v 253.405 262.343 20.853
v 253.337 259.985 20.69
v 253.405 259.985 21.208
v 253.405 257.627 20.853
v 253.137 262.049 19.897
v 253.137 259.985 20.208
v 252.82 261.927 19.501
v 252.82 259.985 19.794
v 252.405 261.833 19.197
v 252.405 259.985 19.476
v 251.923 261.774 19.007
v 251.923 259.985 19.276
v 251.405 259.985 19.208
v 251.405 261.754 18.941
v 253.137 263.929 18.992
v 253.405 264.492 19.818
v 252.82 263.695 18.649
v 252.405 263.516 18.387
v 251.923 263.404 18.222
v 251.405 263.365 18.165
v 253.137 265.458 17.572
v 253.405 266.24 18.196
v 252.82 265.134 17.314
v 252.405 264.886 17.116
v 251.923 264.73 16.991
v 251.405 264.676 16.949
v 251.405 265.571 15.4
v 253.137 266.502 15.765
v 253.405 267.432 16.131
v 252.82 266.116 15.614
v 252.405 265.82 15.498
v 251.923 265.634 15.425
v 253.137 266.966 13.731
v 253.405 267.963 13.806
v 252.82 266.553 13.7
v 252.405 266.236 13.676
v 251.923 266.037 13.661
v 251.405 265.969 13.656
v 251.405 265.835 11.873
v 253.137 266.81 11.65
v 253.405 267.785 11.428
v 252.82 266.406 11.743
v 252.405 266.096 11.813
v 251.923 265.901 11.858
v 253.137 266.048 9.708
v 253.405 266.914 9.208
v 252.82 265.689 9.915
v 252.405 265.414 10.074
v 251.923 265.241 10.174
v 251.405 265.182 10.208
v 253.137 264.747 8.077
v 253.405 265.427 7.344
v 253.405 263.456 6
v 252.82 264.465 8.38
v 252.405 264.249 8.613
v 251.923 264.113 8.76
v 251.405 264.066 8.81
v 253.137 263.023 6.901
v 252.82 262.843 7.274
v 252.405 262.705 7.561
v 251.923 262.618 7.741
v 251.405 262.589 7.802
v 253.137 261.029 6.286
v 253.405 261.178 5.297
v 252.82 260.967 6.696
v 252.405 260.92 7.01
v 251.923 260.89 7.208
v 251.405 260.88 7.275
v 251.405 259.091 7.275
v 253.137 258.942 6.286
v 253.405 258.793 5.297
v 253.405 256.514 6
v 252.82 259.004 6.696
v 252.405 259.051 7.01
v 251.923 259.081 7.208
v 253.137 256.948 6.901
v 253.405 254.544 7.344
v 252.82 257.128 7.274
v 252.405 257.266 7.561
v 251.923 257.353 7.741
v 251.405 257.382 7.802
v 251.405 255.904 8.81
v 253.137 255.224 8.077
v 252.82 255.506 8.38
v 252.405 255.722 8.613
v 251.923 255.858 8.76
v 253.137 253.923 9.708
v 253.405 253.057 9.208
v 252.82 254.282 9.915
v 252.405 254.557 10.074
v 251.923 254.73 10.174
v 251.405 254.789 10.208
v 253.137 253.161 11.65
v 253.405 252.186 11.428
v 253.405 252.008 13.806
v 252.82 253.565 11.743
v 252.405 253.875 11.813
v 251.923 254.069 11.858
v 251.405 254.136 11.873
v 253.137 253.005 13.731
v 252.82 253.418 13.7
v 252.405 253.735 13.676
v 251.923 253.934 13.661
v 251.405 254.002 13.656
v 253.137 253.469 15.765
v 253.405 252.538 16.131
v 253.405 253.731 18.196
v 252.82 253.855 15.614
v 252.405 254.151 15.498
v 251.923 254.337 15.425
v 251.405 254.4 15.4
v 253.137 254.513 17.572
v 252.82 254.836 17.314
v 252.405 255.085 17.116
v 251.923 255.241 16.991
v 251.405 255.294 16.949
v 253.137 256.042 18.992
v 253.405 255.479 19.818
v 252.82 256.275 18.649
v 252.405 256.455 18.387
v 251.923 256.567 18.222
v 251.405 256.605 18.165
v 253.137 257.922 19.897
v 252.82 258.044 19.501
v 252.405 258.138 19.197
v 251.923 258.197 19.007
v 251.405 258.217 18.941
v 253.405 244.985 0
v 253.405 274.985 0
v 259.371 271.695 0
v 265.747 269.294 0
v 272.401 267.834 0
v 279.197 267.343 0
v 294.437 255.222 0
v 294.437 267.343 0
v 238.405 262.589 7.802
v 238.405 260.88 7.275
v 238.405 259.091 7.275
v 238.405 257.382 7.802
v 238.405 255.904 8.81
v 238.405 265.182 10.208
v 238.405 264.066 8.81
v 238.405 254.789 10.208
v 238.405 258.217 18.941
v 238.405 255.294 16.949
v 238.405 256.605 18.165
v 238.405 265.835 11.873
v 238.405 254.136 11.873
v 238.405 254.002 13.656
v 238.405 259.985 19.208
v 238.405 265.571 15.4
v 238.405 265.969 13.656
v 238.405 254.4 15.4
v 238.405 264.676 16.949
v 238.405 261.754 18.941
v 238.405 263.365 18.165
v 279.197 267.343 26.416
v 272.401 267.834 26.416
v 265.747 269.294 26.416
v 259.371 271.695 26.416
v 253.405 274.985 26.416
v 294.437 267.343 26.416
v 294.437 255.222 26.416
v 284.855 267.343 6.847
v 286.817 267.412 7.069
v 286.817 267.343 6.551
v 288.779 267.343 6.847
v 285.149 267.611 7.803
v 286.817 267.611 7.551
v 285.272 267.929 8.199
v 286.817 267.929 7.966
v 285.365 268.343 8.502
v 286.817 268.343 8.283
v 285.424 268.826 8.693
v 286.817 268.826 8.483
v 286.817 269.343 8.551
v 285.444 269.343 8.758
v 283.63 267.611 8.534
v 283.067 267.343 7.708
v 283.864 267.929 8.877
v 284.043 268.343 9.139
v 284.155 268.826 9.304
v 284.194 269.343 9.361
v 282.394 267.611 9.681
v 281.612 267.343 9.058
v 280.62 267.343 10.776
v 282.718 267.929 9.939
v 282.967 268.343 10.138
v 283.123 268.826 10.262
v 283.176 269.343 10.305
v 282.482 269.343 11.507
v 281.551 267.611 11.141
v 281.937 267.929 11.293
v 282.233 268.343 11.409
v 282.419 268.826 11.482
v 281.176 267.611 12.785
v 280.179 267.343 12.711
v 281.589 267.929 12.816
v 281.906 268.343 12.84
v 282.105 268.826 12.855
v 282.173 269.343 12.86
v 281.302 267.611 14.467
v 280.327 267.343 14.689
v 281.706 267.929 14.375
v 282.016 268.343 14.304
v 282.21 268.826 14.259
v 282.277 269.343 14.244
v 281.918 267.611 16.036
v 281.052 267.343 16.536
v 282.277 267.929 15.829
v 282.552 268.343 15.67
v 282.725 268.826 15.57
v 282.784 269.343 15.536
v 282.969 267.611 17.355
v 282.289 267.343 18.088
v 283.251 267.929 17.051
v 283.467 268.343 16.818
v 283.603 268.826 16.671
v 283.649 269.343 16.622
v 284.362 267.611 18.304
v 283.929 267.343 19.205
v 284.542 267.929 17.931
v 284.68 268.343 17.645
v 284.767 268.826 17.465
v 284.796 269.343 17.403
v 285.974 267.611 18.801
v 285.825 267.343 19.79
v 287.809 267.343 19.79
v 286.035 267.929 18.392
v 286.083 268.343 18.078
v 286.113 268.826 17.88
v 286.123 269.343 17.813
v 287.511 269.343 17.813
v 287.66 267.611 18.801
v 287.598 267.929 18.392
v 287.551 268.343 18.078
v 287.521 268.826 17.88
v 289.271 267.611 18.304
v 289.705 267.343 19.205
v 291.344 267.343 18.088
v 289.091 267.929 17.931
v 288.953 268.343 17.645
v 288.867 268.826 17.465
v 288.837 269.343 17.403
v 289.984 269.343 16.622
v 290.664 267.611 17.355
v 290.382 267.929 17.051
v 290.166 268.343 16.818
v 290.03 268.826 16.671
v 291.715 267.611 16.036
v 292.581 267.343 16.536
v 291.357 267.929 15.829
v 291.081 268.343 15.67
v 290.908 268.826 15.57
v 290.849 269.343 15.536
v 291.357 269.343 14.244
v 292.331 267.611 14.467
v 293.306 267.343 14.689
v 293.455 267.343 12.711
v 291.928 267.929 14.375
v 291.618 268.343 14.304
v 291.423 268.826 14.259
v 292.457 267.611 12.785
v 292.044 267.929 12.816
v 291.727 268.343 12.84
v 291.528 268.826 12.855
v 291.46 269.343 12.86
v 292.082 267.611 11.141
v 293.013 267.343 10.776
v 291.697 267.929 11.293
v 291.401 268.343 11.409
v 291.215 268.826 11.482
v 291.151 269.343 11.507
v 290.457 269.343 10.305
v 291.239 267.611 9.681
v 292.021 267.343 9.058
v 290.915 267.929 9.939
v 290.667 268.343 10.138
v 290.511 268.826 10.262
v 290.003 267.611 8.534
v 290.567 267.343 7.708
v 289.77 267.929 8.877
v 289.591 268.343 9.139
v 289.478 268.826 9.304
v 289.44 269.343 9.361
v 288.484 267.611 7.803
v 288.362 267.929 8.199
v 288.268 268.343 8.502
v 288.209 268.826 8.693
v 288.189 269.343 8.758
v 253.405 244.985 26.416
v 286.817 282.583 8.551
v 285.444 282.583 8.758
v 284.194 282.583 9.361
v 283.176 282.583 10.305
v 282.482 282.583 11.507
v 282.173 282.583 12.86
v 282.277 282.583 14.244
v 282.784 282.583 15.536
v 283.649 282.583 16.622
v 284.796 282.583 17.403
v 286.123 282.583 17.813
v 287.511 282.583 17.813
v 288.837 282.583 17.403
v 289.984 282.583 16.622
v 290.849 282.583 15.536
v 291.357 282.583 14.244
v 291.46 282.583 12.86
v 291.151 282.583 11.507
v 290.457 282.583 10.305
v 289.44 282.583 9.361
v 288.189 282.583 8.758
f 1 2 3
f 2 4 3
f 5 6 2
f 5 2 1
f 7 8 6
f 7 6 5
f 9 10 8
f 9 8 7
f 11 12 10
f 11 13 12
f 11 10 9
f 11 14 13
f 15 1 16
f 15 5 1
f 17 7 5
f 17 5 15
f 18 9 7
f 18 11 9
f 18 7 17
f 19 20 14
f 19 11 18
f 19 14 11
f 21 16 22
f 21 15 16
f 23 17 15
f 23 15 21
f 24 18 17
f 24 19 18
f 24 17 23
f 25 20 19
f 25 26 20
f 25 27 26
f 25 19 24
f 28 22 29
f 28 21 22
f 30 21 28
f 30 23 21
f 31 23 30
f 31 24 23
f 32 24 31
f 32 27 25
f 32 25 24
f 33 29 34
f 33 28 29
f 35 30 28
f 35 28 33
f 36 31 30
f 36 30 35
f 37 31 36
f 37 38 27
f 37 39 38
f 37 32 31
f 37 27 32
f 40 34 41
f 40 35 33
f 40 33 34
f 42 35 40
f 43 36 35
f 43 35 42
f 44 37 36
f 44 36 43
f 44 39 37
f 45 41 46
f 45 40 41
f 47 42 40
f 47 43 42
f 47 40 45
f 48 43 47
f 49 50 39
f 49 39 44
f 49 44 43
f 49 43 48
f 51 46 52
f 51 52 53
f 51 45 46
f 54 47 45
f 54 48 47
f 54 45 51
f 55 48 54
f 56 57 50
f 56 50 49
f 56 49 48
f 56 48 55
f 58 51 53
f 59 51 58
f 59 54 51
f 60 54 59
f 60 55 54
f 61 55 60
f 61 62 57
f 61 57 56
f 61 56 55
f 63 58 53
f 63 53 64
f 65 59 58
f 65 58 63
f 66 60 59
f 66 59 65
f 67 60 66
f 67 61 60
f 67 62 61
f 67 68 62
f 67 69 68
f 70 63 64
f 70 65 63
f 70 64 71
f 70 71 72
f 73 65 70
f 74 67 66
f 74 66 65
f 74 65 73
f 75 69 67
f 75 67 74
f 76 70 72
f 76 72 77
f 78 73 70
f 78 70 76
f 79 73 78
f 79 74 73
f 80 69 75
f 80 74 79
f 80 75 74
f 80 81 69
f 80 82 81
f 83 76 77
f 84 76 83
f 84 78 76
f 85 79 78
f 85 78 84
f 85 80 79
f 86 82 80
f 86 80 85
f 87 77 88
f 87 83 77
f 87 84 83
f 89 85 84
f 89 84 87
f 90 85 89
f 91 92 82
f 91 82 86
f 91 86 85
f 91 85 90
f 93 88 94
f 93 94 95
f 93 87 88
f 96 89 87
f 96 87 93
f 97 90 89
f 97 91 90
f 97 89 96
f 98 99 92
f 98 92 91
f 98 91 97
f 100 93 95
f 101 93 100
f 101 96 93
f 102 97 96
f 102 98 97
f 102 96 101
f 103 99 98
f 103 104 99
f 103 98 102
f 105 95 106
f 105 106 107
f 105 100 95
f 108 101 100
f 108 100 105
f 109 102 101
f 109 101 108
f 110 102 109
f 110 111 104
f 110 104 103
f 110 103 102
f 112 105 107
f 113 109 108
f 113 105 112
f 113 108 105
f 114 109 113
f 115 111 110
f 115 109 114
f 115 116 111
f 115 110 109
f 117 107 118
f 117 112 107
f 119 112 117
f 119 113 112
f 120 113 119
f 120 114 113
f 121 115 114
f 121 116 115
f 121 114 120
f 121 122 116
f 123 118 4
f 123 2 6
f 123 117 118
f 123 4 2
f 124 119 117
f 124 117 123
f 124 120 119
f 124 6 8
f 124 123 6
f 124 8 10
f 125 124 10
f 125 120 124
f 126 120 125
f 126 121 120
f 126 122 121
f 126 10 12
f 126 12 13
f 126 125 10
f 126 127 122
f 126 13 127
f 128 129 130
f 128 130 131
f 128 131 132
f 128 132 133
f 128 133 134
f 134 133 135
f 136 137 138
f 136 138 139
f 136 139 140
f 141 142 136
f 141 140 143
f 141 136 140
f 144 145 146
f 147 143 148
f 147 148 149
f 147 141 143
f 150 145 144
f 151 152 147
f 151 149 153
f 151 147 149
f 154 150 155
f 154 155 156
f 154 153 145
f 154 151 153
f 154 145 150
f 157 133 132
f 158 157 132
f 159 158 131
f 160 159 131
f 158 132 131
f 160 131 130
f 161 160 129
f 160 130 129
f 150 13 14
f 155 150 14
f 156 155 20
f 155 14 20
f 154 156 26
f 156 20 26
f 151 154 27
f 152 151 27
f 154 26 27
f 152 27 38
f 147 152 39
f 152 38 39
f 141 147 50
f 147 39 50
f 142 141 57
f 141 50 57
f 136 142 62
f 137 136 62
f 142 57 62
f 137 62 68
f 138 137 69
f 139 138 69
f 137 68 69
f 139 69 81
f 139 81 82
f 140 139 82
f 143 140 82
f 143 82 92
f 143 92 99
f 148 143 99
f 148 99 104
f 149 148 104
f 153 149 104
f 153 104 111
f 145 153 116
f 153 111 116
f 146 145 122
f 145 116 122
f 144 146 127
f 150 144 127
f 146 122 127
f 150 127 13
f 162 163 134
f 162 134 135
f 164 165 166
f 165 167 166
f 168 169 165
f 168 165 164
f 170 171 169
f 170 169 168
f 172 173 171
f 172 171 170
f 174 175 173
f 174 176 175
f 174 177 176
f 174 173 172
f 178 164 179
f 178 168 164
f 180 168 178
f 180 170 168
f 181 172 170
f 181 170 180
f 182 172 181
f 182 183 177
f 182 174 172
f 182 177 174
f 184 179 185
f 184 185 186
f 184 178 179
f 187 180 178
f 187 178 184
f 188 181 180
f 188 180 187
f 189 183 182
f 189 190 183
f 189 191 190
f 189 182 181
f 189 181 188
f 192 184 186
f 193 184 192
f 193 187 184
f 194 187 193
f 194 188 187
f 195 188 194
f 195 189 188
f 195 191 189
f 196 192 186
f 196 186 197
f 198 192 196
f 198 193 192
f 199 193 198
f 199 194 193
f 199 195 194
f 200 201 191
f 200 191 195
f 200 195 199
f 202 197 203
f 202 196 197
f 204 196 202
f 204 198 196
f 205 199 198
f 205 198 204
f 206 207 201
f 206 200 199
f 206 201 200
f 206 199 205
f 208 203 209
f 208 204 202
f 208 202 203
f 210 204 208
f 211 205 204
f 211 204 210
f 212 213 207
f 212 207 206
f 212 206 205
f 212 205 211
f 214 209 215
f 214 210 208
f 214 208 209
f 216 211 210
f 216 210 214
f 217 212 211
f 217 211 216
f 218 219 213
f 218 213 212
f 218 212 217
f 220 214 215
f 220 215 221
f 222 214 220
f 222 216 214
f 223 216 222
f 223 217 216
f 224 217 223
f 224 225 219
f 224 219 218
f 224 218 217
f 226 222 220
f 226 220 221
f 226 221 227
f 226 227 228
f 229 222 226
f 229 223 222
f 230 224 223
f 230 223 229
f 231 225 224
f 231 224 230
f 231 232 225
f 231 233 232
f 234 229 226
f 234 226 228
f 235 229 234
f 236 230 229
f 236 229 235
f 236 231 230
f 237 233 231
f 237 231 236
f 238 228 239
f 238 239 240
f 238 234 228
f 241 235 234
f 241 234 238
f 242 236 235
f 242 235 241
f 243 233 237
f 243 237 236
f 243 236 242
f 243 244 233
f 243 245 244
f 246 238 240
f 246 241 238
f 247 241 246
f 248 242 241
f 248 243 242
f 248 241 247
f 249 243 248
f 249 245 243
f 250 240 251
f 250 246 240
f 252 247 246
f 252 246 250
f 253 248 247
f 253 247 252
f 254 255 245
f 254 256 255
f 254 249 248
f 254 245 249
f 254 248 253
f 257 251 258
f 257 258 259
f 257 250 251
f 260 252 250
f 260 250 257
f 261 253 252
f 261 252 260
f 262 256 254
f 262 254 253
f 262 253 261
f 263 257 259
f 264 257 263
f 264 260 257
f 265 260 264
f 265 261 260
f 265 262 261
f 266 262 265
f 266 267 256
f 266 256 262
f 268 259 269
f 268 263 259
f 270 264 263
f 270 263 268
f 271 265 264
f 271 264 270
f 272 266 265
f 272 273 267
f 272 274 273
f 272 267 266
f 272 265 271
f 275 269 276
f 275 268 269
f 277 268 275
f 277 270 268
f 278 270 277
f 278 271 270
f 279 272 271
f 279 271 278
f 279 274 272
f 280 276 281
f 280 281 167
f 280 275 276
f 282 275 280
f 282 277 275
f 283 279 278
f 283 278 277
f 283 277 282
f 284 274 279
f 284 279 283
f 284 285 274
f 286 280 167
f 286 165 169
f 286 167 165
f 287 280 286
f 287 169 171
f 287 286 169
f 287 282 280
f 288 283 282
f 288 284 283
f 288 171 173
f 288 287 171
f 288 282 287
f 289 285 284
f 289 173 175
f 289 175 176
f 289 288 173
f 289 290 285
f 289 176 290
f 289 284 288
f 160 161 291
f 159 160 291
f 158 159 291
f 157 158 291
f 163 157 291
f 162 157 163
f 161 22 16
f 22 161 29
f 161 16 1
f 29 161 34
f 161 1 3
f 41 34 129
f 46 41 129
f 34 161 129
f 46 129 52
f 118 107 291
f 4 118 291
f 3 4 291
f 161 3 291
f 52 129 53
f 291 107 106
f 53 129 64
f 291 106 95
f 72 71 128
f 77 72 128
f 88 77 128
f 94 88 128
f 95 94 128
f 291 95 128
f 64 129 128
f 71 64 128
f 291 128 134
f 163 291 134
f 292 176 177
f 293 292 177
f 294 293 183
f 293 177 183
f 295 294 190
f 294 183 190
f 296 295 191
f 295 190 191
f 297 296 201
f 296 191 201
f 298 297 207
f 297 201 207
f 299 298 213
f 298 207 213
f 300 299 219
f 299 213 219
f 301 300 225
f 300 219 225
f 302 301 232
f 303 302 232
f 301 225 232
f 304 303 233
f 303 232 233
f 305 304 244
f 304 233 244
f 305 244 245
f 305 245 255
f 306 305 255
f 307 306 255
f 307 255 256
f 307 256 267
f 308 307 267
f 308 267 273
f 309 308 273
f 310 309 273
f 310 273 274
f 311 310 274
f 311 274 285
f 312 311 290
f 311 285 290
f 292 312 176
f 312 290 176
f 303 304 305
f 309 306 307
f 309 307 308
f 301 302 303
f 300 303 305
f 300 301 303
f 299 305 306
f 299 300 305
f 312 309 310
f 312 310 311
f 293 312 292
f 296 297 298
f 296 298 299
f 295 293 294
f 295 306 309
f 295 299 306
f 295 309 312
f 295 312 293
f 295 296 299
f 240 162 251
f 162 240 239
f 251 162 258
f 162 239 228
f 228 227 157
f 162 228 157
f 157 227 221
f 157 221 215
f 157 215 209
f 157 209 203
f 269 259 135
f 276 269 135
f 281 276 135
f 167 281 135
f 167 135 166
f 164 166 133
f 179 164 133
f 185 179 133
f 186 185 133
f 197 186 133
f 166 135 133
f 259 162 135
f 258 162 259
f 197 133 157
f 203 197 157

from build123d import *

# Parameters (mm, degrees)
BOSS_EXTRUDE1_DEPTH = 26.416
SKETCH5_R           = 4.656567863
BOSS_EXTRUDE2_DEPTH = 15.24
SKETCH6_R           = 6
BOSS_EXTRUDE3_DEPTH = 15
FILLET1_R           = 2
FILLET2_R           = 2


with BuildPart() as part:
    # Sketch4 → Boss-Extrude1 (new body)
    with BuildSketch(Plane.XY):
        with BuildLine():
            Line((253.405334172, 274.985392586), (253.405334172, 244.985392586))
            Line((253.405334172, 244.985392586), (294.436722218, 255.22168408))
            Line((294.436722218, 255.22168408), (294.436722218, 267.343480441))
            Line((294.436722218, 267.343480441), (279.196722218, 267.343480441))
            ThreePointArc((279.196722218, 267.343480441), (265.746866098, 269.294144182), (253.405334172, 274.985392586))
        make_face()
    extrude(amount=BOSS_EXTRUDE1_DEPTH)

    # Sketch5 → Boss-Extrude2 (add)
    with BuildSketch(Plane(origin=(0, 267.343480441, 0), x_dir=(1, 0, 0), z_dir=(0, 1, 0))):
        with Locations(Location((286.816722218, -13.208, 0), (0, 0, 90))):
            Circle(SKETCH5_R)
    extrude(amount=BOSS_EXTRUDE2_DEPTH)

    # Sketch6 → Boss-Extrude3 (add)
    with BuildSketch(Plane.ZY.offset(-253.405334172)):
        with Locations((13.208, 259.985392586)):
            Circle(SKETCH6_R)
    extrude(amount=BOSS_EXTRUDE3_DEPTH)

    # Fillet1
    fillet1_edges = [part.edges().sort_by_distance(p)[0] for p in [
        (253.405334172, 259.985392586, 7.208),
    ]]
    fillet(fillet1_edges, radius=FILLET1_R)

    # Fillet2
    fillet2_edges = [part.edges().sort_by_distance(p)[0] for p in [
        (286.816722218, 267.343480441, 17.864567863),
    ]]
    fillet(fillet2_edges, radius=FILLET2_R)


solid = part.part
